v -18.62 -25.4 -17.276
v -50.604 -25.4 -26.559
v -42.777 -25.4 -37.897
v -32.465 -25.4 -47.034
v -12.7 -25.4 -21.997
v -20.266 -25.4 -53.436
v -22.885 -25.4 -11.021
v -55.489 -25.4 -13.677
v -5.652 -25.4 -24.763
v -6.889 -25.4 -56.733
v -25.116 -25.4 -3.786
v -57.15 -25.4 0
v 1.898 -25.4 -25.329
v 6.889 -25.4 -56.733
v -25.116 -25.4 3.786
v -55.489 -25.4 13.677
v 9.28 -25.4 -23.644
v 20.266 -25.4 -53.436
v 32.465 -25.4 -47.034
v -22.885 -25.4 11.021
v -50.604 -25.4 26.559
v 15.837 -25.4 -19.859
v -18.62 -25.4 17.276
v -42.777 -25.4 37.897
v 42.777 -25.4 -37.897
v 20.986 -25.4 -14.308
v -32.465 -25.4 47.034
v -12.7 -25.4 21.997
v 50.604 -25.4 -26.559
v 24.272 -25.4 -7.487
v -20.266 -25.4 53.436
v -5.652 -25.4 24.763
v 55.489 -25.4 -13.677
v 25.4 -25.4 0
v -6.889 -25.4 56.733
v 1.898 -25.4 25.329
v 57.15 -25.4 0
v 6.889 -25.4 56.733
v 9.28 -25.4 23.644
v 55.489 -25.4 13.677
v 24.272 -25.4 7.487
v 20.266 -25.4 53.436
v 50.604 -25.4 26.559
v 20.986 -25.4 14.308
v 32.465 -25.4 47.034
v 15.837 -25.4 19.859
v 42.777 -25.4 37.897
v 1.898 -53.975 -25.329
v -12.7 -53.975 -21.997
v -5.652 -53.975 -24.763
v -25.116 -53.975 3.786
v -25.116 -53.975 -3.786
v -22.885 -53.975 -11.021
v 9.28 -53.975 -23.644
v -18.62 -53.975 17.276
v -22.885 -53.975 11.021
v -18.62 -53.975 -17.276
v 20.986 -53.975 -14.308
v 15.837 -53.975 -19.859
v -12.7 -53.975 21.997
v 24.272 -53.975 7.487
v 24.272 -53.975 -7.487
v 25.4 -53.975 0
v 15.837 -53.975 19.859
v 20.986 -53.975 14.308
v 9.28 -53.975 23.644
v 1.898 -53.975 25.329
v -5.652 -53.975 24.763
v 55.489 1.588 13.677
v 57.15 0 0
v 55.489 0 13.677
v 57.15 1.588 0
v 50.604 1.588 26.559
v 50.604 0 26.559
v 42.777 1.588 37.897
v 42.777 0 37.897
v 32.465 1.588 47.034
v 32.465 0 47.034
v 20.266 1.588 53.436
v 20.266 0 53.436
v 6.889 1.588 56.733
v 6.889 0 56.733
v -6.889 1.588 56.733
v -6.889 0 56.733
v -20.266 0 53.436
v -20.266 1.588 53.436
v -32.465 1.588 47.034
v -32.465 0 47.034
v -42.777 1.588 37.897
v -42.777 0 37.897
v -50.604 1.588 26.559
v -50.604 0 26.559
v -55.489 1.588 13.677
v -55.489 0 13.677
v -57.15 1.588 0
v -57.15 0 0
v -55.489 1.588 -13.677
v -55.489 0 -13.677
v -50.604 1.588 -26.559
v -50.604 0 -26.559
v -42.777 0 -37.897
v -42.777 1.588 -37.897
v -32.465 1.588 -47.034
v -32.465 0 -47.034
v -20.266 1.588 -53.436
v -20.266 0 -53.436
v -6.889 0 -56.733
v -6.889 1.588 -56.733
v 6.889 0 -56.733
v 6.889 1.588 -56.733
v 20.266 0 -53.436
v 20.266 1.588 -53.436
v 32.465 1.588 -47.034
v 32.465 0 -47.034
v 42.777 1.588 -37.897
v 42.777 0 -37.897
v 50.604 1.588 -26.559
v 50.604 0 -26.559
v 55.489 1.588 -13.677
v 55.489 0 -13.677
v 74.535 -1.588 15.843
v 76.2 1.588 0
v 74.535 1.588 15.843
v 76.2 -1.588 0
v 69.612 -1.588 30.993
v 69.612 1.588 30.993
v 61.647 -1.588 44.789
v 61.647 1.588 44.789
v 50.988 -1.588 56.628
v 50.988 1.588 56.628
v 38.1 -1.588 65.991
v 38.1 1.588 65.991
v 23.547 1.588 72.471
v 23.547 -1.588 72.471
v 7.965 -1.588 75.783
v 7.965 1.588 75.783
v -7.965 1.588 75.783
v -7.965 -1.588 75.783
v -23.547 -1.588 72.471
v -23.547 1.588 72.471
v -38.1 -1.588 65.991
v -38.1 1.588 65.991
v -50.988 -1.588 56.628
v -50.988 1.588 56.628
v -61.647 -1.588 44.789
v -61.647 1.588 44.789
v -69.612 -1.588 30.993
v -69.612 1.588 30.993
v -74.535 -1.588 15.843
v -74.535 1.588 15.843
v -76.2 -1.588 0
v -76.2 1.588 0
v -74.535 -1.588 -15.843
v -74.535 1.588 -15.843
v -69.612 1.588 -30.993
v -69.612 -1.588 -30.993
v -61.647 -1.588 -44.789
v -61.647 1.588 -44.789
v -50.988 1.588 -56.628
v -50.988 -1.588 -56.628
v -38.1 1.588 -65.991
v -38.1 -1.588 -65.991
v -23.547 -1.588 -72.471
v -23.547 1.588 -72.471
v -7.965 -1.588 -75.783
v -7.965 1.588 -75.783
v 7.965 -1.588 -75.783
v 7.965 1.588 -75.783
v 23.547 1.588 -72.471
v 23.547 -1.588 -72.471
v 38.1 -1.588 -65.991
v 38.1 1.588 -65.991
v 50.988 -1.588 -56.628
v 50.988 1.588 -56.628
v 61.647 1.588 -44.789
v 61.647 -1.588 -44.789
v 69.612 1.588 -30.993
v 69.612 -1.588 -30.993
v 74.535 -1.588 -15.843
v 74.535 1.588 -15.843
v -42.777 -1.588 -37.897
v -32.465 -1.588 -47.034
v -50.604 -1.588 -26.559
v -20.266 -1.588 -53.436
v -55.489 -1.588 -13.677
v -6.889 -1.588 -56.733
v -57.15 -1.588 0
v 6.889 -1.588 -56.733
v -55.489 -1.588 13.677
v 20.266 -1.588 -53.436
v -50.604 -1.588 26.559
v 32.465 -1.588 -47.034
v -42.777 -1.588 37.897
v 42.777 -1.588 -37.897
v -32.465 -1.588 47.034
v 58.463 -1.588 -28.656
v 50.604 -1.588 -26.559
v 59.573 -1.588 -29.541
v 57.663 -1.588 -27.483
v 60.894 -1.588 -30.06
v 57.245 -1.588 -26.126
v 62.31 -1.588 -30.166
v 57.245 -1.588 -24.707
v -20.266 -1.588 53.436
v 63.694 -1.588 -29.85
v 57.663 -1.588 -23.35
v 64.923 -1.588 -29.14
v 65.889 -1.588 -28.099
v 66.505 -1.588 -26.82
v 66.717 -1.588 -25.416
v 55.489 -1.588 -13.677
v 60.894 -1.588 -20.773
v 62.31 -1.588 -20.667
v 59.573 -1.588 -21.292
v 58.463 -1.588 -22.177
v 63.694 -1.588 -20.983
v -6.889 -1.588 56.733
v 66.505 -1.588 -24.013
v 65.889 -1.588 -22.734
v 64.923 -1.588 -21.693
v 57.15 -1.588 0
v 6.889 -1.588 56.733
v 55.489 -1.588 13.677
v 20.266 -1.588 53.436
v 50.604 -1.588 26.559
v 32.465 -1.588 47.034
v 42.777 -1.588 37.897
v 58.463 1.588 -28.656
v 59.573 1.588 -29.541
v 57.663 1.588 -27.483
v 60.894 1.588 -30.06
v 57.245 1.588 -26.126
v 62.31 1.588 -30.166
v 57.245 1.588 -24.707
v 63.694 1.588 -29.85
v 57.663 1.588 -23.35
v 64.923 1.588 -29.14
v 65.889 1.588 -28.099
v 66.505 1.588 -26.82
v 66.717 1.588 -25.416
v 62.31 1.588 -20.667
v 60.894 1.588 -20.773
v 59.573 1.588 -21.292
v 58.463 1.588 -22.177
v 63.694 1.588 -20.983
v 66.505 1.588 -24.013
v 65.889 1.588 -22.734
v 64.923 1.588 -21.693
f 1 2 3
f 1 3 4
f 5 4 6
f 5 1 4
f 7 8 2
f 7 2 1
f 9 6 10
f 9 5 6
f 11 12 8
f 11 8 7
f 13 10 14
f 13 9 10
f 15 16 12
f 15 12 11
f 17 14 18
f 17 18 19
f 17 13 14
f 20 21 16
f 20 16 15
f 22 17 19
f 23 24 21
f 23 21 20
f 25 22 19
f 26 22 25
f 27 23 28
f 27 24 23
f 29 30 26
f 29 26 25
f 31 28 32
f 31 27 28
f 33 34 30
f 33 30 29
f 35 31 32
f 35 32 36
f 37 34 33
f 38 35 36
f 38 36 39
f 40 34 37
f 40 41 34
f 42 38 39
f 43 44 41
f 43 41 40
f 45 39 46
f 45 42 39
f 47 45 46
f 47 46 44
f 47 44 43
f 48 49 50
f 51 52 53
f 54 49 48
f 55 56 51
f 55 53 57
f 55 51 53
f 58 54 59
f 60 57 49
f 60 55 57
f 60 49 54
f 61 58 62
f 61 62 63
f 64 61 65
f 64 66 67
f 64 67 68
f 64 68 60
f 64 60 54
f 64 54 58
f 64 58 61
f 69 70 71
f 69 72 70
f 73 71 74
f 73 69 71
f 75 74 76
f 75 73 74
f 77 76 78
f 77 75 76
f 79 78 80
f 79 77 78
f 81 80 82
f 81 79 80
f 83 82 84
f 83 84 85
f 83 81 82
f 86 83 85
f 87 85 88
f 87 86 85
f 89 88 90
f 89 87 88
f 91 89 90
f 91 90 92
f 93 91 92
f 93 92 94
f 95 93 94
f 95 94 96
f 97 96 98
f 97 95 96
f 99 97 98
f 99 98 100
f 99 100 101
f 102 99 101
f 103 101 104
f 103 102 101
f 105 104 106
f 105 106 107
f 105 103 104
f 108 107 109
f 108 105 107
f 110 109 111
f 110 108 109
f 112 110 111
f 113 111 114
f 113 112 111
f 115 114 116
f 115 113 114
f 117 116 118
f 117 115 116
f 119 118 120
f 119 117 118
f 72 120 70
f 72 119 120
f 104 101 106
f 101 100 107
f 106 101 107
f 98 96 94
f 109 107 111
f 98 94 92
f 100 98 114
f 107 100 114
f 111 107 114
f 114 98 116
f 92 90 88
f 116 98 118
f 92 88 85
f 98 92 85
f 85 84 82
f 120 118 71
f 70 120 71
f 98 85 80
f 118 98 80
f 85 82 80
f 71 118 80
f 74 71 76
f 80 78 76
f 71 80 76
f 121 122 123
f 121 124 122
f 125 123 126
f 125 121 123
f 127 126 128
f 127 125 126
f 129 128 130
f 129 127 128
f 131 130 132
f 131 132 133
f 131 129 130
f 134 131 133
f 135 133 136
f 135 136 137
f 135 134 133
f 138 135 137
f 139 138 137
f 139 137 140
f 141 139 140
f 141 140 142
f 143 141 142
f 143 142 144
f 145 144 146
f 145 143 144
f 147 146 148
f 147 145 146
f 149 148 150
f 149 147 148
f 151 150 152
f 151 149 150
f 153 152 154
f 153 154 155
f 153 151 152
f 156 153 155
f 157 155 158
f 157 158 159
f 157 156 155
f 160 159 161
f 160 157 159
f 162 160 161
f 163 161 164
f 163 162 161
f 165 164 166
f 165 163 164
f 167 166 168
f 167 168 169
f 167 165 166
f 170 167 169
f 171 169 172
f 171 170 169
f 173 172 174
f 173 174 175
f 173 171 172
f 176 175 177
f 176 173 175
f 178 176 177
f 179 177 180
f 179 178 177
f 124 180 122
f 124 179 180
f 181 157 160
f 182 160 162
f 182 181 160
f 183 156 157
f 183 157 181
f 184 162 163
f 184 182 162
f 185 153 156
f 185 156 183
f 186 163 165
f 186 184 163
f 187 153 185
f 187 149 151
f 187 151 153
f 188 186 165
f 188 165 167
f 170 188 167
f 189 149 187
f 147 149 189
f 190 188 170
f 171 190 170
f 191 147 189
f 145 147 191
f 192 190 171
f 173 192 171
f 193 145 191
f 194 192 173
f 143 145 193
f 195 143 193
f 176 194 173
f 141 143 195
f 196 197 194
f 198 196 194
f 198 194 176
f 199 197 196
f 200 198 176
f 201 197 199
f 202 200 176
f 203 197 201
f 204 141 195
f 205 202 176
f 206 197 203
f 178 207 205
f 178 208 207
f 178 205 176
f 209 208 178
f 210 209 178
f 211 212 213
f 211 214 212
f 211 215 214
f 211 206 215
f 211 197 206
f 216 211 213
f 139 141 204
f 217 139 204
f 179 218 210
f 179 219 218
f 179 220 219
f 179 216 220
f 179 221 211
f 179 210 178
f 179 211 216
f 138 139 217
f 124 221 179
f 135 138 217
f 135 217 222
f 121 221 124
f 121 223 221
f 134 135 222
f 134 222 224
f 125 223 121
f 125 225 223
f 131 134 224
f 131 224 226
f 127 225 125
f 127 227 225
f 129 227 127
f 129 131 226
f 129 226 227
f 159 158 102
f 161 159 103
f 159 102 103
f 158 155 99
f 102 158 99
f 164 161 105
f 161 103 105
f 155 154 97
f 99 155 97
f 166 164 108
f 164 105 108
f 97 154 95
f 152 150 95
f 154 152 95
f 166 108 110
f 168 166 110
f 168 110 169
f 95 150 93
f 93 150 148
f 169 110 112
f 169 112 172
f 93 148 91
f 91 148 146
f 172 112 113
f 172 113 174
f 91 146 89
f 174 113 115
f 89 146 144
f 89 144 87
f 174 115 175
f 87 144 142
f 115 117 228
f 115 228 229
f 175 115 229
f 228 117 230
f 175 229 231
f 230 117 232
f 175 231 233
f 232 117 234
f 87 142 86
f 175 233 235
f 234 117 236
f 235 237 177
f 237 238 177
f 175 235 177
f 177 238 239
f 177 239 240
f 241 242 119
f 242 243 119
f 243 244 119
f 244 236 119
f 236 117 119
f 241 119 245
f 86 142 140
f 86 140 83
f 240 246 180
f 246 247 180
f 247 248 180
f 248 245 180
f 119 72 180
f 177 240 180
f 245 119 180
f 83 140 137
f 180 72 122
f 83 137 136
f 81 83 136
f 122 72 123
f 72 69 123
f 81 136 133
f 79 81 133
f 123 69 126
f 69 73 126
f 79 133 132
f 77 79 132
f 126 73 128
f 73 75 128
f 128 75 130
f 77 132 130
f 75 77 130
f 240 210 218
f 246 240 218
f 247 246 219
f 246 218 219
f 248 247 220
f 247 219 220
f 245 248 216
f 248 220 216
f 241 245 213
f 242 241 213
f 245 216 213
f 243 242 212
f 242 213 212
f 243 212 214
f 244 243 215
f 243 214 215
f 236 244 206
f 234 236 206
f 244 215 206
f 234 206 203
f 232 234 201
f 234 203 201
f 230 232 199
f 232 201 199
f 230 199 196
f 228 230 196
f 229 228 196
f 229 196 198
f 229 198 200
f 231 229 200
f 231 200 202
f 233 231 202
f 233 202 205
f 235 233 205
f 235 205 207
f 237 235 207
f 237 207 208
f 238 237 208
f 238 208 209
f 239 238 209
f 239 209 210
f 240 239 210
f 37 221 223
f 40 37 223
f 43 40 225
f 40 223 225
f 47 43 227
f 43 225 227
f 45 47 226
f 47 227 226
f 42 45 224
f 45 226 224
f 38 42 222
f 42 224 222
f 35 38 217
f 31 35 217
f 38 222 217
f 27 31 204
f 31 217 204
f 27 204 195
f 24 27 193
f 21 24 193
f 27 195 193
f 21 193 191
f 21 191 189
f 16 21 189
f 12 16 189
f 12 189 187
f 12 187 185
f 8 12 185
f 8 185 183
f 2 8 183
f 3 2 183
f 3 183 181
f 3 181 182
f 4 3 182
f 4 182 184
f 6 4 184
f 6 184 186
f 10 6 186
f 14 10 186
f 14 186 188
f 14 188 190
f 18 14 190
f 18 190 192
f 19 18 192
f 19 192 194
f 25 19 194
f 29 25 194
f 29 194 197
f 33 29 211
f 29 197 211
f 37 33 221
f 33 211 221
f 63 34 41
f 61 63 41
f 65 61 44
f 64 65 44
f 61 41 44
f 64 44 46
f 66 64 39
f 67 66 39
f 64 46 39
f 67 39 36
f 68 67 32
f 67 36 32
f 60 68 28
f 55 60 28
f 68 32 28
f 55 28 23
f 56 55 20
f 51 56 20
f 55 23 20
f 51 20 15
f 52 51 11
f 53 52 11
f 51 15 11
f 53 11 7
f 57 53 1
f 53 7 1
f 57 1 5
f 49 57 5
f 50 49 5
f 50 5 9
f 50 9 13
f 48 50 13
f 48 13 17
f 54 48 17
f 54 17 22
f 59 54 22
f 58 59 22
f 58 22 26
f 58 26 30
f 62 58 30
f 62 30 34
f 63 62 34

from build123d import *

# Parameters (mm, degrees)
F0_R     = 57.15
F0_R_2   = 25.4
F1_DEPTH = 25.4
F0_R_3   = 76.2
F2_DEPTH = 1.5875
F3_DEPTH = 53.975
F4_R     = 4.7625
F5_DEPTH = 3.176


with BuildPart() as f1:
    # F0 (on Front) → F1 (new body)
    with BuildSketch(Plane.XZ):
        Circle(F0_R)
        Circle(F0_R_2, mode=Mode.SUBTRACT)
    extrude(amount=F1_DEPTH)

    # F0 (on Front) → F2 (join, symmetric)
    with BuildSketch(Plane.XZ):
        Circle(F0_R_3)
        Circle(F0_R, mode=Mode.SUBTRACT)
    extrude(amount=F2_DEPTH, both=True)

    # F0 (on Front) → F3 (join)
    with BuildSketch(Plane.XZ):
        Circle(F0_R_2)
    extrude(amount=F3_DEPTH)

    # F4 (on face) → F5 (cut, through all)
    with BuildSketch(Plane.XZ.offset(1.5875)):
        with Locations((61.95407, -25.41648)):
            Circle(F4_R)
    extrude(amount=-F5_DEPTH, mode=Mode.SUBTRACT)


solid = f1.part
